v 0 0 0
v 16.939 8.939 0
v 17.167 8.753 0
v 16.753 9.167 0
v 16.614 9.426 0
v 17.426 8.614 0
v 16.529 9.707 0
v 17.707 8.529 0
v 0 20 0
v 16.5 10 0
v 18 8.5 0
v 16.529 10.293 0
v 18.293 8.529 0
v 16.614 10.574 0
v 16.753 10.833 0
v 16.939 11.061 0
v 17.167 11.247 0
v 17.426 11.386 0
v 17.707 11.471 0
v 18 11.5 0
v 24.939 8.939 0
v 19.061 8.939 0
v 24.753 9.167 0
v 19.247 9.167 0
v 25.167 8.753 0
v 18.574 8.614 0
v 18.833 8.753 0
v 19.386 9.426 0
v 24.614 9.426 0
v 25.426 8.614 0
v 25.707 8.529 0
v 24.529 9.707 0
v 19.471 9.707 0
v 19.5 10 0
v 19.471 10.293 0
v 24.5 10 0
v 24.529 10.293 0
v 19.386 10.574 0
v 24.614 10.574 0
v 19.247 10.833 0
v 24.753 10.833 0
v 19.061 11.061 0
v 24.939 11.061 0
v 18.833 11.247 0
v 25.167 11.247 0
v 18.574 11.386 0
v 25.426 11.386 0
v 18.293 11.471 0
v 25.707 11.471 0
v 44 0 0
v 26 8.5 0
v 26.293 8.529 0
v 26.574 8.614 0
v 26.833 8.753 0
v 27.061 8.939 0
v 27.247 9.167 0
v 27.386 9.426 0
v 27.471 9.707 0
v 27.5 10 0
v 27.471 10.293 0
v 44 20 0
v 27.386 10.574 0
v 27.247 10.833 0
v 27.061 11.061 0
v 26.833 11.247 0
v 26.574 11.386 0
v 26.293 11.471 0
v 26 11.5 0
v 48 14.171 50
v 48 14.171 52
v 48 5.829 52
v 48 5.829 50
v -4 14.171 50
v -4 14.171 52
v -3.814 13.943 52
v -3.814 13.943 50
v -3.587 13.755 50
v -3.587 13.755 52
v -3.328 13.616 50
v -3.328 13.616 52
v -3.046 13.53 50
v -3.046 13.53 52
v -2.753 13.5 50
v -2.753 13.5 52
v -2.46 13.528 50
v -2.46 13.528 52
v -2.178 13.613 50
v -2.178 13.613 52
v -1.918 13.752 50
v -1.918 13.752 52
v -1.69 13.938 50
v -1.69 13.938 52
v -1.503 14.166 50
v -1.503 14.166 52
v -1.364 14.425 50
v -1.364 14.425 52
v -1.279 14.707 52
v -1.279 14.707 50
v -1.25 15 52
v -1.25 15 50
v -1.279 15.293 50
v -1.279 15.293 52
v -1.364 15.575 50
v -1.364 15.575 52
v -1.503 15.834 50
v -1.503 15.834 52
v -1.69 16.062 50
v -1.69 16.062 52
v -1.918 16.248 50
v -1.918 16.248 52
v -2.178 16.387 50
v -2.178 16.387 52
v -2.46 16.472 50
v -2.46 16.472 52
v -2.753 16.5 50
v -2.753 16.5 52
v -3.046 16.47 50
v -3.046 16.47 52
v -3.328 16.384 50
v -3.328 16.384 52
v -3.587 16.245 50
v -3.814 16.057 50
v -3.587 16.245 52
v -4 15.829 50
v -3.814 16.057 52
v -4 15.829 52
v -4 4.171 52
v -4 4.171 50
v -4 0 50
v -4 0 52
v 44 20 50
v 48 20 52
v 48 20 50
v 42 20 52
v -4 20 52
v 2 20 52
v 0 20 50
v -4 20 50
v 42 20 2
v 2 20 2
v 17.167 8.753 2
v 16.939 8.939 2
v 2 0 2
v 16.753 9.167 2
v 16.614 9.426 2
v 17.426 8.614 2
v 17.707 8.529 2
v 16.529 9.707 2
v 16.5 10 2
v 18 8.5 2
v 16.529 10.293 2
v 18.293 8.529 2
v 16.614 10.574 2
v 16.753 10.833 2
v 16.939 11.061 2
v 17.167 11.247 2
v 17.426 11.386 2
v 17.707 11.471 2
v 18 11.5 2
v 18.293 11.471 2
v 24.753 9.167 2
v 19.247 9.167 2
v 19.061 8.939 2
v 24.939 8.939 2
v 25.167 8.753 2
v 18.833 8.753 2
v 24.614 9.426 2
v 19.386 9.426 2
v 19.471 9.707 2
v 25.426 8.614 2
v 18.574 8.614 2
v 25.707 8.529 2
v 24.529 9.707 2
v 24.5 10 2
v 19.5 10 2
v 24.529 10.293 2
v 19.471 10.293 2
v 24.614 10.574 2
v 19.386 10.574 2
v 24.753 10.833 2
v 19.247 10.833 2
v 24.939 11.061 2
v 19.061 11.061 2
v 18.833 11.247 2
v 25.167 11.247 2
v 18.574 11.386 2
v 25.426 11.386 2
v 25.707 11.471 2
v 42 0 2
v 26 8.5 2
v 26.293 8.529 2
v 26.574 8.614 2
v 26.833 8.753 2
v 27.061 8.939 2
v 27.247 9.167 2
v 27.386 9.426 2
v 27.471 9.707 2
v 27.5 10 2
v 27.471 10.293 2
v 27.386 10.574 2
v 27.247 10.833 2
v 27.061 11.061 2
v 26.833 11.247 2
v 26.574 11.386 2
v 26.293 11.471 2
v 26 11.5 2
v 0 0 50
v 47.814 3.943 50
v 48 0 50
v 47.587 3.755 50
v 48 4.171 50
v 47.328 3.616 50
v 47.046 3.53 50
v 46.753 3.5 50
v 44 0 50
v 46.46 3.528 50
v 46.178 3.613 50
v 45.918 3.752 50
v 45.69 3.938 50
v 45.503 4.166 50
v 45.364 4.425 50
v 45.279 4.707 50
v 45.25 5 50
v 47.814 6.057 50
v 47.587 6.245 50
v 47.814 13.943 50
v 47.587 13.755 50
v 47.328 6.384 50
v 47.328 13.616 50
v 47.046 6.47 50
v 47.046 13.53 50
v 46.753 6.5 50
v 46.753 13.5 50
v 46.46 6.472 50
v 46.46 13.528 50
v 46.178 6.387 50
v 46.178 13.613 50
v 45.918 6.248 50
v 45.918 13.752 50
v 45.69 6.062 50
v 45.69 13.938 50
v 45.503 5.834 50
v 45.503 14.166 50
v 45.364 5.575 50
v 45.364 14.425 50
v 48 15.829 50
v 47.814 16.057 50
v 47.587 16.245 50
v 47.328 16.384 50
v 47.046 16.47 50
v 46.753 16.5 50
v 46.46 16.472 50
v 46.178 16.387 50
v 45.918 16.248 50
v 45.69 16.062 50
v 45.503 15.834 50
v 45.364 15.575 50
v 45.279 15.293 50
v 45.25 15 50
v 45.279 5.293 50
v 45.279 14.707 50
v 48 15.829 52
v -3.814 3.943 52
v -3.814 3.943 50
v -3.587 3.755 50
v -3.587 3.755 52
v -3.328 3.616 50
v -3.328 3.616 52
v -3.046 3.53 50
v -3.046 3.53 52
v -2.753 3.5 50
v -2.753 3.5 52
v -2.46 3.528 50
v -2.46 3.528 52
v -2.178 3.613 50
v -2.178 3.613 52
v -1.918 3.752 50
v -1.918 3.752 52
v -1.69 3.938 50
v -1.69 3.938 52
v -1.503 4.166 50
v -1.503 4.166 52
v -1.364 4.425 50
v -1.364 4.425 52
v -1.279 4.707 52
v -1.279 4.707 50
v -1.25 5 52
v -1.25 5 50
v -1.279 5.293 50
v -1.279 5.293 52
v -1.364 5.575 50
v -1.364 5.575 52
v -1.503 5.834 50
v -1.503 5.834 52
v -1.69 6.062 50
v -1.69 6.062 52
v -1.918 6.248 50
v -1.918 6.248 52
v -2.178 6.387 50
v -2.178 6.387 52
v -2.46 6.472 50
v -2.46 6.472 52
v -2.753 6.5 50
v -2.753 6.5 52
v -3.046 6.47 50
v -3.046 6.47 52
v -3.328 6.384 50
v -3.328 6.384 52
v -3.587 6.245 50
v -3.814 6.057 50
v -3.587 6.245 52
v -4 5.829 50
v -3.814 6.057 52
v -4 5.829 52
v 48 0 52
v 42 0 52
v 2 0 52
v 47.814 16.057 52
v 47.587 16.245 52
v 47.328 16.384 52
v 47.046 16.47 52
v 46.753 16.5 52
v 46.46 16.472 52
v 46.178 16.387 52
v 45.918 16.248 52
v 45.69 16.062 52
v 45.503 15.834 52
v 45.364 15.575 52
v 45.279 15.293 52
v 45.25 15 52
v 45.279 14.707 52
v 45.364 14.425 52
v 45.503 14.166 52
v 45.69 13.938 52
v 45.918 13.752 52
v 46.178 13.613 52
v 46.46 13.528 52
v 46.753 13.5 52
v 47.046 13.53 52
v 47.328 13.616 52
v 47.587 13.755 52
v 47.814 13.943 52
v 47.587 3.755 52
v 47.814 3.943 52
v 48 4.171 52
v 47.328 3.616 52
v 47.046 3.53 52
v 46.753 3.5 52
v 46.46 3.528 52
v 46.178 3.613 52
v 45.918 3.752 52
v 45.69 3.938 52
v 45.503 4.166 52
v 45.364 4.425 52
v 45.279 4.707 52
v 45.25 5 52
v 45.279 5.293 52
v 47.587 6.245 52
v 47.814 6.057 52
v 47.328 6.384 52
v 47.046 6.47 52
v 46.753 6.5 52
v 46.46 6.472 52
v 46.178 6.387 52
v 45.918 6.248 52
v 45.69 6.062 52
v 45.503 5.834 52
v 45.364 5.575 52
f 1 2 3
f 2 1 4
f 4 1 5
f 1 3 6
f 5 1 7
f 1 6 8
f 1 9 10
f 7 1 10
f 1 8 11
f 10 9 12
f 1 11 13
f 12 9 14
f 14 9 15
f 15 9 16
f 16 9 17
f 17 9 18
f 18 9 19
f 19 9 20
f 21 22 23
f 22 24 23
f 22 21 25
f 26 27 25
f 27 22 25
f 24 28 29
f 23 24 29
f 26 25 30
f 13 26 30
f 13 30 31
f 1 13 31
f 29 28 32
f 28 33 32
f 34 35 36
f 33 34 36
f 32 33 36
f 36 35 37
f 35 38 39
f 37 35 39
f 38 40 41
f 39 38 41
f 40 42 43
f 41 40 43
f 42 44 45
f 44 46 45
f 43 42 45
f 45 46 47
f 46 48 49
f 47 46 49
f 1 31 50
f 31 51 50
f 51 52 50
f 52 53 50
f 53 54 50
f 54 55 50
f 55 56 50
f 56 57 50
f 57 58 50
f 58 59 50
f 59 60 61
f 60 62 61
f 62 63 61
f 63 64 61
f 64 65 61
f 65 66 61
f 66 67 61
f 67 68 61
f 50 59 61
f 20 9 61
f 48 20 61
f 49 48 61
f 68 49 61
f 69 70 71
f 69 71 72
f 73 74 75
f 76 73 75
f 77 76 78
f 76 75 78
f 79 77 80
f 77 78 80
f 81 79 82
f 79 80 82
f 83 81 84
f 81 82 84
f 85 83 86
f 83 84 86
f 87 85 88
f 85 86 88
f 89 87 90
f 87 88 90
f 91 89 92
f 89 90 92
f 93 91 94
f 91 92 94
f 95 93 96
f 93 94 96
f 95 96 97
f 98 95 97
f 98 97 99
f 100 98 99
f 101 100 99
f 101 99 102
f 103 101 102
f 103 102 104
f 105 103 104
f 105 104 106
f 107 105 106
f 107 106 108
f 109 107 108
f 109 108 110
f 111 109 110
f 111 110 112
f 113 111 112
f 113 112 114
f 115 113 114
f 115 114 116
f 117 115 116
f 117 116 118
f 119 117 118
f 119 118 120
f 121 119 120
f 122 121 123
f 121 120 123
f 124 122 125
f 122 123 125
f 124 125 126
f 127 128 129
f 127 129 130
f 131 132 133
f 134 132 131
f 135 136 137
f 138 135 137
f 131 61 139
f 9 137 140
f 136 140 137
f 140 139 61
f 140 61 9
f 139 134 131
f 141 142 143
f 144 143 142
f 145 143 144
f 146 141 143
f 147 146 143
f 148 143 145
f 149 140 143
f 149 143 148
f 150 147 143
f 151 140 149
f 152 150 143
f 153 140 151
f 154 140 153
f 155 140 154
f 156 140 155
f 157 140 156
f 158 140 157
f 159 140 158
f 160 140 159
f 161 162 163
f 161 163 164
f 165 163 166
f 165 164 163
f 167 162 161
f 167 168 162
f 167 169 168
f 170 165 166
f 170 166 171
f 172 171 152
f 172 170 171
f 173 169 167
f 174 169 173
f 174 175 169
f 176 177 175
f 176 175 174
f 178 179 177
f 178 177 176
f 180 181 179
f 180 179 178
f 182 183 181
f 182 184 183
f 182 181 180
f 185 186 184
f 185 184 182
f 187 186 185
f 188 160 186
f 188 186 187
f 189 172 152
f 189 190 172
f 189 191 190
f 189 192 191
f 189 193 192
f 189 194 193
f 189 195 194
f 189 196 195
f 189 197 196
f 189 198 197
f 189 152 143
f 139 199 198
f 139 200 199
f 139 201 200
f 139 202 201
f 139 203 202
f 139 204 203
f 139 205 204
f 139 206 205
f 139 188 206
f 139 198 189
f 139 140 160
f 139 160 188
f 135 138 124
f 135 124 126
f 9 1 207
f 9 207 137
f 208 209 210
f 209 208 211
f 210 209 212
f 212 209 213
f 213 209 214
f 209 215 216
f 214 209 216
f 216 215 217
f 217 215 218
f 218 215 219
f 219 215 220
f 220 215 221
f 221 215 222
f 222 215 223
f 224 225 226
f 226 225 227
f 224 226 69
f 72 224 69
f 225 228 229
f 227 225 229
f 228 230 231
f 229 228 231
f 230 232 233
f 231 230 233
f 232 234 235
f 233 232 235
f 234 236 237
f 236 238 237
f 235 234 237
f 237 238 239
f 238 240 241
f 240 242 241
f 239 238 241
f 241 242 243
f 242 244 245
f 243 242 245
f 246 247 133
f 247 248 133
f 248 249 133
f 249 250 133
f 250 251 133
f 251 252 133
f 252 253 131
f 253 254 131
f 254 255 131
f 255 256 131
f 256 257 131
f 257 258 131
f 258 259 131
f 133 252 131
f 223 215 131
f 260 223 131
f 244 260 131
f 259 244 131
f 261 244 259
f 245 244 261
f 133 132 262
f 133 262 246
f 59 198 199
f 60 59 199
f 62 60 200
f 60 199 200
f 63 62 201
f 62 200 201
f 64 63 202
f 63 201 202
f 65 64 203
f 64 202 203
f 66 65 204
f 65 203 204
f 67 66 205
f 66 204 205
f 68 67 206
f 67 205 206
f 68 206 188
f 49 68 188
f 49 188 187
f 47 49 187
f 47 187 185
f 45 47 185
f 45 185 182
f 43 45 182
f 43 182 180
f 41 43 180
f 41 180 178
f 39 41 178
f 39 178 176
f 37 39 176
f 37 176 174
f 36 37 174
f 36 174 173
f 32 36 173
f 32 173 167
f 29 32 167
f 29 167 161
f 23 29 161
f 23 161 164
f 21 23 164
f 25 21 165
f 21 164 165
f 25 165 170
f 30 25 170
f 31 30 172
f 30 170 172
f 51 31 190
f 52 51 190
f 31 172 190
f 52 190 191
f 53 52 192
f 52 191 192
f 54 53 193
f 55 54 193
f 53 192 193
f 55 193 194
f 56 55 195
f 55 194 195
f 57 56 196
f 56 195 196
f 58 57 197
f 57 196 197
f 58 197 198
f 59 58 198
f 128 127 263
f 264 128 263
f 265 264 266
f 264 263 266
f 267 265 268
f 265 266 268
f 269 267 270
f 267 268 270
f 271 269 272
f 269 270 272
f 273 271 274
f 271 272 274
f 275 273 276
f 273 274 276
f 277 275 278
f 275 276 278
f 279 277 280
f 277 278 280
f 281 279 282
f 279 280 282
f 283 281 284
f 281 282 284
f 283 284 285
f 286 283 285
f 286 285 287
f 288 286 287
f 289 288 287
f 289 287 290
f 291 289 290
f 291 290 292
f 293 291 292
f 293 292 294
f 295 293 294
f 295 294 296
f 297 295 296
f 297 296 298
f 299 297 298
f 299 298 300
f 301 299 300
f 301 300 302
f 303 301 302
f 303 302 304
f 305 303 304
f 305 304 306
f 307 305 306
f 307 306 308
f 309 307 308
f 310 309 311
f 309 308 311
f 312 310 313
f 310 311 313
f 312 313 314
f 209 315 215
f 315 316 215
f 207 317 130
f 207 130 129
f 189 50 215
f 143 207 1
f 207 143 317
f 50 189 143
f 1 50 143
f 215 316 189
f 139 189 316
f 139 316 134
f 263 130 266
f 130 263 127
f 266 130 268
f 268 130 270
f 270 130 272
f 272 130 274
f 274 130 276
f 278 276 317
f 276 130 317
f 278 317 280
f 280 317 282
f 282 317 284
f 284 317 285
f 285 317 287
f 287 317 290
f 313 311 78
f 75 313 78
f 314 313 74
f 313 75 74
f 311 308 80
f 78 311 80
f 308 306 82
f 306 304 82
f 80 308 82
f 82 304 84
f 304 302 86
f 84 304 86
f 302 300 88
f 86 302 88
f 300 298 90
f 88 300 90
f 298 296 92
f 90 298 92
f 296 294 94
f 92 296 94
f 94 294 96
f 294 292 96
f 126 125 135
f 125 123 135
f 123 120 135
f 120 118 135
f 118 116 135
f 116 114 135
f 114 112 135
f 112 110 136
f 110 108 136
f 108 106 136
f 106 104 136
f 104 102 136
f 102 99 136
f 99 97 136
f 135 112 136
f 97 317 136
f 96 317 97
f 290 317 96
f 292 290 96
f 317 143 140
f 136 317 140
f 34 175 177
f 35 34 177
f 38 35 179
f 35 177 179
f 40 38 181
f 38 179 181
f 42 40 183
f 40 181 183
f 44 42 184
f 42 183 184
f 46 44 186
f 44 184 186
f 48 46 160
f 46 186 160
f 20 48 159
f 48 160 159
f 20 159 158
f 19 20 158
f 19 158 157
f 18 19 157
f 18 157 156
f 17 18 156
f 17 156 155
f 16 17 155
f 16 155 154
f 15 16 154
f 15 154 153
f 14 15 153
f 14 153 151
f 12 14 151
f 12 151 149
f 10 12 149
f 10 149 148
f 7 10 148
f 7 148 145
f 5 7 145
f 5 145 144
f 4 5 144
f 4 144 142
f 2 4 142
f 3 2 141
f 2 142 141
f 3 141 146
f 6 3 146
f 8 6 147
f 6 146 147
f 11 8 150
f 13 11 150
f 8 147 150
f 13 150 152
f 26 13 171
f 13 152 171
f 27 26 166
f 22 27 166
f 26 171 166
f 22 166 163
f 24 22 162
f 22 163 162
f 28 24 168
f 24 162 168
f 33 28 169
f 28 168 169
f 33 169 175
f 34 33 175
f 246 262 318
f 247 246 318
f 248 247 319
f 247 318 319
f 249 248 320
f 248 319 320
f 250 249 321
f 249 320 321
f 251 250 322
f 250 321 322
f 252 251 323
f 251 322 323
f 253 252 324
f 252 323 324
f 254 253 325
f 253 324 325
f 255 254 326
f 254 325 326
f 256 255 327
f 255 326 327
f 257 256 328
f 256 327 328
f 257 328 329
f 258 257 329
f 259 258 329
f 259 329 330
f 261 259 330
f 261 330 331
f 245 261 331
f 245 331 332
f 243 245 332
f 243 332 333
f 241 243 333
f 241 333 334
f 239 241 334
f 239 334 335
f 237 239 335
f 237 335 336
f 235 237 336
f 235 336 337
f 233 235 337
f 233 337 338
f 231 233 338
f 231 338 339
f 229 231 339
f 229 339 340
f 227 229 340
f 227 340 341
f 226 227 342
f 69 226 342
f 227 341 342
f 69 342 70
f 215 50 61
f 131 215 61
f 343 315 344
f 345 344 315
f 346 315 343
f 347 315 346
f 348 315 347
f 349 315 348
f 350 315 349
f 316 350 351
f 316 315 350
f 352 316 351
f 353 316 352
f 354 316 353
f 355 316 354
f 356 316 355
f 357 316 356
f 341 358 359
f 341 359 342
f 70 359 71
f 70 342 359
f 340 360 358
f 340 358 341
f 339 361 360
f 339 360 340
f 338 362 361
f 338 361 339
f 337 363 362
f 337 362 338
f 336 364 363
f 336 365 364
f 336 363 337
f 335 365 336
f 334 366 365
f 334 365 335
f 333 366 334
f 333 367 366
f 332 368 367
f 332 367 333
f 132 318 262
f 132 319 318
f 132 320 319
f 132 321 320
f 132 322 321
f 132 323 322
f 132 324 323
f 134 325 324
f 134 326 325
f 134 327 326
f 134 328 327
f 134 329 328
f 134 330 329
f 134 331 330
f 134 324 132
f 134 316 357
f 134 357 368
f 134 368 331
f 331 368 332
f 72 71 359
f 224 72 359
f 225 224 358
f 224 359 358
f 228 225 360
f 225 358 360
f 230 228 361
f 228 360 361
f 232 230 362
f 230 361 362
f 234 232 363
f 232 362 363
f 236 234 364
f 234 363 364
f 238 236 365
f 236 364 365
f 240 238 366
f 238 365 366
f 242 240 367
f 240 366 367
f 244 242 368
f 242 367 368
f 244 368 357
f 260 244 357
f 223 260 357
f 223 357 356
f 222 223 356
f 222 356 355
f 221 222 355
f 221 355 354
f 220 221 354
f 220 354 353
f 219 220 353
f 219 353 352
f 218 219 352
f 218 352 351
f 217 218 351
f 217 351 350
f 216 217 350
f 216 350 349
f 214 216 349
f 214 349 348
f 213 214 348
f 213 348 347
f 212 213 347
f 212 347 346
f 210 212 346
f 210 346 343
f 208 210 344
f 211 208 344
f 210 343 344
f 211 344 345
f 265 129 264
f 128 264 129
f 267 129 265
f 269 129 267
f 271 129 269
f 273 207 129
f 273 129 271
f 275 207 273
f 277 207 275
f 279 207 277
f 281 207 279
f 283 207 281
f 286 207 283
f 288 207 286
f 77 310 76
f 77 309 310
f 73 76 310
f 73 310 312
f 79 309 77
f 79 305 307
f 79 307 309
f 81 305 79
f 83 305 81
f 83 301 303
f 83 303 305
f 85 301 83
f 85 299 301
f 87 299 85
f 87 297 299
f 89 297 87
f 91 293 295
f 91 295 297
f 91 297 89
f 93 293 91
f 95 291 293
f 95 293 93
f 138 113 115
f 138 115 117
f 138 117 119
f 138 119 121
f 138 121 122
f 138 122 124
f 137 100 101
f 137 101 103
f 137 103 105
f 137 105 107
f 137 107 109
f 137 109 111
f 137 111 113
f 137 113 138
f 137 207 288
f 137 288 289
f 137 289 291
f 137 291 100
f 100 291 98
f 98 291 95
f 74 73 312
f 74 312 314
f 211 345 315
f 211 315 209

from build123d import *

# Parameters (mm, degrees)
ESQUISSE1_W             = 44
ESQUISSE1_H             = 20
BOSS_EXTRU_1_DEPTH      = 2
ESQUISSE2_W             = 2
ESQUISSE2_H             = 20
BOSS_EXTRU_2_DEPTH      = 50
ESQUISSE3_W             = 2
ESQUISSE3_H             = 20
BOSS_EXTRU_3_DEPTH      = 4
ESQUISSE4_W             = 2
ESQUISSE4_H             = 20
BOSS_EXTRU_4_DEPTH      = 4
ESQUISSE5_R             = 1.5
ENL_V_MAT_EXTRU_1_DEPTH = 4
ESQUISSE6_R             = 1.5
ENL_V_MAT_EXTRU_2_DEPTH = 4


with BuildPart() as part:
    # Esquisse1 → Boss.-Extru.1 (new body)
    with BuildSketch(Plane.XY):
        with Locations((22, 10)):
            Rectangle(ESQUISSE1_W, ESQUISSE1_H)
    extrude(amount=BOSS_EXTRU_1_DEPTH)

    # Esquisse2 → Boss.-Extru.2 (add)
    with BuildSketch(Plane.XY.offset(2)):
        with Locations((1, 10)):
            Rectangle(ESQUISSE2_W, ESQUISSE2_H)
        with Locations((43, 10)):
            Rectangle(ESQUISSE2_W, ESQUISSE2_H)
    extrude(amount=BOSS_EXTRU_2_DEPTH)

    # Esquisse3 → Boss.-Extru.3 (add)
    with BuildSketch(Plane.ZY):
        with Locations((51, 10)):
            Rectangle(ESQUISSE3_W, ESQUISSE3_H)
    extrude(amount=BOSS_EXTRU_3_DEPTH)

    # Esquisse4 → Boss.-Extru.4 (add)
    with BuildSketch(Plane(origin=(44, 0, 0), x_dir=(0, 0, -1), z_dir=(1, 0, 0))):
        with Locations((-51, 10)):
            Rectangle(ESQUISSE4_W, ESQUISSE4_H)
    extrude(amount=BOSS_EXTRU_4_DEPTH)

    # Esquisse5 → Enlèv. mat.-Extru.1 (cut)
    with BuildSketch(Plane.XY.offset(2)):
        with Locations((18, 10)):
            Circle(ESQUISSE5_R)
        with Locations((26, 10)):
            Circle(ESQUISSE5_R)
    extrude(amount=-ENL_V_MAT_EXTRU_1_DEPTH, mode=Mode.SUBTRACT)

    # Esquisse6 → Enlèv. mat.-Extru.2 (cut)
    with BuildSketch(Plane.XY.offset(52)):
        with Locations((46.75, 15)):
            Circle(ESQUISSE6_R)
        with Locations((46.75, 5)):
            Circle(ESQUISSE6_R)
        with Locations((-2.75, 15)):
            Circle(ESQUISSE6_R)
        with Locations((-2.75, 5)):
            Circle(ESQUISSE6_R)
    extrude(amount=-ENL_V_MAT_EXTRU_2_DEPTH, mode=Mode.SUBTRACT)


solid = part.part
